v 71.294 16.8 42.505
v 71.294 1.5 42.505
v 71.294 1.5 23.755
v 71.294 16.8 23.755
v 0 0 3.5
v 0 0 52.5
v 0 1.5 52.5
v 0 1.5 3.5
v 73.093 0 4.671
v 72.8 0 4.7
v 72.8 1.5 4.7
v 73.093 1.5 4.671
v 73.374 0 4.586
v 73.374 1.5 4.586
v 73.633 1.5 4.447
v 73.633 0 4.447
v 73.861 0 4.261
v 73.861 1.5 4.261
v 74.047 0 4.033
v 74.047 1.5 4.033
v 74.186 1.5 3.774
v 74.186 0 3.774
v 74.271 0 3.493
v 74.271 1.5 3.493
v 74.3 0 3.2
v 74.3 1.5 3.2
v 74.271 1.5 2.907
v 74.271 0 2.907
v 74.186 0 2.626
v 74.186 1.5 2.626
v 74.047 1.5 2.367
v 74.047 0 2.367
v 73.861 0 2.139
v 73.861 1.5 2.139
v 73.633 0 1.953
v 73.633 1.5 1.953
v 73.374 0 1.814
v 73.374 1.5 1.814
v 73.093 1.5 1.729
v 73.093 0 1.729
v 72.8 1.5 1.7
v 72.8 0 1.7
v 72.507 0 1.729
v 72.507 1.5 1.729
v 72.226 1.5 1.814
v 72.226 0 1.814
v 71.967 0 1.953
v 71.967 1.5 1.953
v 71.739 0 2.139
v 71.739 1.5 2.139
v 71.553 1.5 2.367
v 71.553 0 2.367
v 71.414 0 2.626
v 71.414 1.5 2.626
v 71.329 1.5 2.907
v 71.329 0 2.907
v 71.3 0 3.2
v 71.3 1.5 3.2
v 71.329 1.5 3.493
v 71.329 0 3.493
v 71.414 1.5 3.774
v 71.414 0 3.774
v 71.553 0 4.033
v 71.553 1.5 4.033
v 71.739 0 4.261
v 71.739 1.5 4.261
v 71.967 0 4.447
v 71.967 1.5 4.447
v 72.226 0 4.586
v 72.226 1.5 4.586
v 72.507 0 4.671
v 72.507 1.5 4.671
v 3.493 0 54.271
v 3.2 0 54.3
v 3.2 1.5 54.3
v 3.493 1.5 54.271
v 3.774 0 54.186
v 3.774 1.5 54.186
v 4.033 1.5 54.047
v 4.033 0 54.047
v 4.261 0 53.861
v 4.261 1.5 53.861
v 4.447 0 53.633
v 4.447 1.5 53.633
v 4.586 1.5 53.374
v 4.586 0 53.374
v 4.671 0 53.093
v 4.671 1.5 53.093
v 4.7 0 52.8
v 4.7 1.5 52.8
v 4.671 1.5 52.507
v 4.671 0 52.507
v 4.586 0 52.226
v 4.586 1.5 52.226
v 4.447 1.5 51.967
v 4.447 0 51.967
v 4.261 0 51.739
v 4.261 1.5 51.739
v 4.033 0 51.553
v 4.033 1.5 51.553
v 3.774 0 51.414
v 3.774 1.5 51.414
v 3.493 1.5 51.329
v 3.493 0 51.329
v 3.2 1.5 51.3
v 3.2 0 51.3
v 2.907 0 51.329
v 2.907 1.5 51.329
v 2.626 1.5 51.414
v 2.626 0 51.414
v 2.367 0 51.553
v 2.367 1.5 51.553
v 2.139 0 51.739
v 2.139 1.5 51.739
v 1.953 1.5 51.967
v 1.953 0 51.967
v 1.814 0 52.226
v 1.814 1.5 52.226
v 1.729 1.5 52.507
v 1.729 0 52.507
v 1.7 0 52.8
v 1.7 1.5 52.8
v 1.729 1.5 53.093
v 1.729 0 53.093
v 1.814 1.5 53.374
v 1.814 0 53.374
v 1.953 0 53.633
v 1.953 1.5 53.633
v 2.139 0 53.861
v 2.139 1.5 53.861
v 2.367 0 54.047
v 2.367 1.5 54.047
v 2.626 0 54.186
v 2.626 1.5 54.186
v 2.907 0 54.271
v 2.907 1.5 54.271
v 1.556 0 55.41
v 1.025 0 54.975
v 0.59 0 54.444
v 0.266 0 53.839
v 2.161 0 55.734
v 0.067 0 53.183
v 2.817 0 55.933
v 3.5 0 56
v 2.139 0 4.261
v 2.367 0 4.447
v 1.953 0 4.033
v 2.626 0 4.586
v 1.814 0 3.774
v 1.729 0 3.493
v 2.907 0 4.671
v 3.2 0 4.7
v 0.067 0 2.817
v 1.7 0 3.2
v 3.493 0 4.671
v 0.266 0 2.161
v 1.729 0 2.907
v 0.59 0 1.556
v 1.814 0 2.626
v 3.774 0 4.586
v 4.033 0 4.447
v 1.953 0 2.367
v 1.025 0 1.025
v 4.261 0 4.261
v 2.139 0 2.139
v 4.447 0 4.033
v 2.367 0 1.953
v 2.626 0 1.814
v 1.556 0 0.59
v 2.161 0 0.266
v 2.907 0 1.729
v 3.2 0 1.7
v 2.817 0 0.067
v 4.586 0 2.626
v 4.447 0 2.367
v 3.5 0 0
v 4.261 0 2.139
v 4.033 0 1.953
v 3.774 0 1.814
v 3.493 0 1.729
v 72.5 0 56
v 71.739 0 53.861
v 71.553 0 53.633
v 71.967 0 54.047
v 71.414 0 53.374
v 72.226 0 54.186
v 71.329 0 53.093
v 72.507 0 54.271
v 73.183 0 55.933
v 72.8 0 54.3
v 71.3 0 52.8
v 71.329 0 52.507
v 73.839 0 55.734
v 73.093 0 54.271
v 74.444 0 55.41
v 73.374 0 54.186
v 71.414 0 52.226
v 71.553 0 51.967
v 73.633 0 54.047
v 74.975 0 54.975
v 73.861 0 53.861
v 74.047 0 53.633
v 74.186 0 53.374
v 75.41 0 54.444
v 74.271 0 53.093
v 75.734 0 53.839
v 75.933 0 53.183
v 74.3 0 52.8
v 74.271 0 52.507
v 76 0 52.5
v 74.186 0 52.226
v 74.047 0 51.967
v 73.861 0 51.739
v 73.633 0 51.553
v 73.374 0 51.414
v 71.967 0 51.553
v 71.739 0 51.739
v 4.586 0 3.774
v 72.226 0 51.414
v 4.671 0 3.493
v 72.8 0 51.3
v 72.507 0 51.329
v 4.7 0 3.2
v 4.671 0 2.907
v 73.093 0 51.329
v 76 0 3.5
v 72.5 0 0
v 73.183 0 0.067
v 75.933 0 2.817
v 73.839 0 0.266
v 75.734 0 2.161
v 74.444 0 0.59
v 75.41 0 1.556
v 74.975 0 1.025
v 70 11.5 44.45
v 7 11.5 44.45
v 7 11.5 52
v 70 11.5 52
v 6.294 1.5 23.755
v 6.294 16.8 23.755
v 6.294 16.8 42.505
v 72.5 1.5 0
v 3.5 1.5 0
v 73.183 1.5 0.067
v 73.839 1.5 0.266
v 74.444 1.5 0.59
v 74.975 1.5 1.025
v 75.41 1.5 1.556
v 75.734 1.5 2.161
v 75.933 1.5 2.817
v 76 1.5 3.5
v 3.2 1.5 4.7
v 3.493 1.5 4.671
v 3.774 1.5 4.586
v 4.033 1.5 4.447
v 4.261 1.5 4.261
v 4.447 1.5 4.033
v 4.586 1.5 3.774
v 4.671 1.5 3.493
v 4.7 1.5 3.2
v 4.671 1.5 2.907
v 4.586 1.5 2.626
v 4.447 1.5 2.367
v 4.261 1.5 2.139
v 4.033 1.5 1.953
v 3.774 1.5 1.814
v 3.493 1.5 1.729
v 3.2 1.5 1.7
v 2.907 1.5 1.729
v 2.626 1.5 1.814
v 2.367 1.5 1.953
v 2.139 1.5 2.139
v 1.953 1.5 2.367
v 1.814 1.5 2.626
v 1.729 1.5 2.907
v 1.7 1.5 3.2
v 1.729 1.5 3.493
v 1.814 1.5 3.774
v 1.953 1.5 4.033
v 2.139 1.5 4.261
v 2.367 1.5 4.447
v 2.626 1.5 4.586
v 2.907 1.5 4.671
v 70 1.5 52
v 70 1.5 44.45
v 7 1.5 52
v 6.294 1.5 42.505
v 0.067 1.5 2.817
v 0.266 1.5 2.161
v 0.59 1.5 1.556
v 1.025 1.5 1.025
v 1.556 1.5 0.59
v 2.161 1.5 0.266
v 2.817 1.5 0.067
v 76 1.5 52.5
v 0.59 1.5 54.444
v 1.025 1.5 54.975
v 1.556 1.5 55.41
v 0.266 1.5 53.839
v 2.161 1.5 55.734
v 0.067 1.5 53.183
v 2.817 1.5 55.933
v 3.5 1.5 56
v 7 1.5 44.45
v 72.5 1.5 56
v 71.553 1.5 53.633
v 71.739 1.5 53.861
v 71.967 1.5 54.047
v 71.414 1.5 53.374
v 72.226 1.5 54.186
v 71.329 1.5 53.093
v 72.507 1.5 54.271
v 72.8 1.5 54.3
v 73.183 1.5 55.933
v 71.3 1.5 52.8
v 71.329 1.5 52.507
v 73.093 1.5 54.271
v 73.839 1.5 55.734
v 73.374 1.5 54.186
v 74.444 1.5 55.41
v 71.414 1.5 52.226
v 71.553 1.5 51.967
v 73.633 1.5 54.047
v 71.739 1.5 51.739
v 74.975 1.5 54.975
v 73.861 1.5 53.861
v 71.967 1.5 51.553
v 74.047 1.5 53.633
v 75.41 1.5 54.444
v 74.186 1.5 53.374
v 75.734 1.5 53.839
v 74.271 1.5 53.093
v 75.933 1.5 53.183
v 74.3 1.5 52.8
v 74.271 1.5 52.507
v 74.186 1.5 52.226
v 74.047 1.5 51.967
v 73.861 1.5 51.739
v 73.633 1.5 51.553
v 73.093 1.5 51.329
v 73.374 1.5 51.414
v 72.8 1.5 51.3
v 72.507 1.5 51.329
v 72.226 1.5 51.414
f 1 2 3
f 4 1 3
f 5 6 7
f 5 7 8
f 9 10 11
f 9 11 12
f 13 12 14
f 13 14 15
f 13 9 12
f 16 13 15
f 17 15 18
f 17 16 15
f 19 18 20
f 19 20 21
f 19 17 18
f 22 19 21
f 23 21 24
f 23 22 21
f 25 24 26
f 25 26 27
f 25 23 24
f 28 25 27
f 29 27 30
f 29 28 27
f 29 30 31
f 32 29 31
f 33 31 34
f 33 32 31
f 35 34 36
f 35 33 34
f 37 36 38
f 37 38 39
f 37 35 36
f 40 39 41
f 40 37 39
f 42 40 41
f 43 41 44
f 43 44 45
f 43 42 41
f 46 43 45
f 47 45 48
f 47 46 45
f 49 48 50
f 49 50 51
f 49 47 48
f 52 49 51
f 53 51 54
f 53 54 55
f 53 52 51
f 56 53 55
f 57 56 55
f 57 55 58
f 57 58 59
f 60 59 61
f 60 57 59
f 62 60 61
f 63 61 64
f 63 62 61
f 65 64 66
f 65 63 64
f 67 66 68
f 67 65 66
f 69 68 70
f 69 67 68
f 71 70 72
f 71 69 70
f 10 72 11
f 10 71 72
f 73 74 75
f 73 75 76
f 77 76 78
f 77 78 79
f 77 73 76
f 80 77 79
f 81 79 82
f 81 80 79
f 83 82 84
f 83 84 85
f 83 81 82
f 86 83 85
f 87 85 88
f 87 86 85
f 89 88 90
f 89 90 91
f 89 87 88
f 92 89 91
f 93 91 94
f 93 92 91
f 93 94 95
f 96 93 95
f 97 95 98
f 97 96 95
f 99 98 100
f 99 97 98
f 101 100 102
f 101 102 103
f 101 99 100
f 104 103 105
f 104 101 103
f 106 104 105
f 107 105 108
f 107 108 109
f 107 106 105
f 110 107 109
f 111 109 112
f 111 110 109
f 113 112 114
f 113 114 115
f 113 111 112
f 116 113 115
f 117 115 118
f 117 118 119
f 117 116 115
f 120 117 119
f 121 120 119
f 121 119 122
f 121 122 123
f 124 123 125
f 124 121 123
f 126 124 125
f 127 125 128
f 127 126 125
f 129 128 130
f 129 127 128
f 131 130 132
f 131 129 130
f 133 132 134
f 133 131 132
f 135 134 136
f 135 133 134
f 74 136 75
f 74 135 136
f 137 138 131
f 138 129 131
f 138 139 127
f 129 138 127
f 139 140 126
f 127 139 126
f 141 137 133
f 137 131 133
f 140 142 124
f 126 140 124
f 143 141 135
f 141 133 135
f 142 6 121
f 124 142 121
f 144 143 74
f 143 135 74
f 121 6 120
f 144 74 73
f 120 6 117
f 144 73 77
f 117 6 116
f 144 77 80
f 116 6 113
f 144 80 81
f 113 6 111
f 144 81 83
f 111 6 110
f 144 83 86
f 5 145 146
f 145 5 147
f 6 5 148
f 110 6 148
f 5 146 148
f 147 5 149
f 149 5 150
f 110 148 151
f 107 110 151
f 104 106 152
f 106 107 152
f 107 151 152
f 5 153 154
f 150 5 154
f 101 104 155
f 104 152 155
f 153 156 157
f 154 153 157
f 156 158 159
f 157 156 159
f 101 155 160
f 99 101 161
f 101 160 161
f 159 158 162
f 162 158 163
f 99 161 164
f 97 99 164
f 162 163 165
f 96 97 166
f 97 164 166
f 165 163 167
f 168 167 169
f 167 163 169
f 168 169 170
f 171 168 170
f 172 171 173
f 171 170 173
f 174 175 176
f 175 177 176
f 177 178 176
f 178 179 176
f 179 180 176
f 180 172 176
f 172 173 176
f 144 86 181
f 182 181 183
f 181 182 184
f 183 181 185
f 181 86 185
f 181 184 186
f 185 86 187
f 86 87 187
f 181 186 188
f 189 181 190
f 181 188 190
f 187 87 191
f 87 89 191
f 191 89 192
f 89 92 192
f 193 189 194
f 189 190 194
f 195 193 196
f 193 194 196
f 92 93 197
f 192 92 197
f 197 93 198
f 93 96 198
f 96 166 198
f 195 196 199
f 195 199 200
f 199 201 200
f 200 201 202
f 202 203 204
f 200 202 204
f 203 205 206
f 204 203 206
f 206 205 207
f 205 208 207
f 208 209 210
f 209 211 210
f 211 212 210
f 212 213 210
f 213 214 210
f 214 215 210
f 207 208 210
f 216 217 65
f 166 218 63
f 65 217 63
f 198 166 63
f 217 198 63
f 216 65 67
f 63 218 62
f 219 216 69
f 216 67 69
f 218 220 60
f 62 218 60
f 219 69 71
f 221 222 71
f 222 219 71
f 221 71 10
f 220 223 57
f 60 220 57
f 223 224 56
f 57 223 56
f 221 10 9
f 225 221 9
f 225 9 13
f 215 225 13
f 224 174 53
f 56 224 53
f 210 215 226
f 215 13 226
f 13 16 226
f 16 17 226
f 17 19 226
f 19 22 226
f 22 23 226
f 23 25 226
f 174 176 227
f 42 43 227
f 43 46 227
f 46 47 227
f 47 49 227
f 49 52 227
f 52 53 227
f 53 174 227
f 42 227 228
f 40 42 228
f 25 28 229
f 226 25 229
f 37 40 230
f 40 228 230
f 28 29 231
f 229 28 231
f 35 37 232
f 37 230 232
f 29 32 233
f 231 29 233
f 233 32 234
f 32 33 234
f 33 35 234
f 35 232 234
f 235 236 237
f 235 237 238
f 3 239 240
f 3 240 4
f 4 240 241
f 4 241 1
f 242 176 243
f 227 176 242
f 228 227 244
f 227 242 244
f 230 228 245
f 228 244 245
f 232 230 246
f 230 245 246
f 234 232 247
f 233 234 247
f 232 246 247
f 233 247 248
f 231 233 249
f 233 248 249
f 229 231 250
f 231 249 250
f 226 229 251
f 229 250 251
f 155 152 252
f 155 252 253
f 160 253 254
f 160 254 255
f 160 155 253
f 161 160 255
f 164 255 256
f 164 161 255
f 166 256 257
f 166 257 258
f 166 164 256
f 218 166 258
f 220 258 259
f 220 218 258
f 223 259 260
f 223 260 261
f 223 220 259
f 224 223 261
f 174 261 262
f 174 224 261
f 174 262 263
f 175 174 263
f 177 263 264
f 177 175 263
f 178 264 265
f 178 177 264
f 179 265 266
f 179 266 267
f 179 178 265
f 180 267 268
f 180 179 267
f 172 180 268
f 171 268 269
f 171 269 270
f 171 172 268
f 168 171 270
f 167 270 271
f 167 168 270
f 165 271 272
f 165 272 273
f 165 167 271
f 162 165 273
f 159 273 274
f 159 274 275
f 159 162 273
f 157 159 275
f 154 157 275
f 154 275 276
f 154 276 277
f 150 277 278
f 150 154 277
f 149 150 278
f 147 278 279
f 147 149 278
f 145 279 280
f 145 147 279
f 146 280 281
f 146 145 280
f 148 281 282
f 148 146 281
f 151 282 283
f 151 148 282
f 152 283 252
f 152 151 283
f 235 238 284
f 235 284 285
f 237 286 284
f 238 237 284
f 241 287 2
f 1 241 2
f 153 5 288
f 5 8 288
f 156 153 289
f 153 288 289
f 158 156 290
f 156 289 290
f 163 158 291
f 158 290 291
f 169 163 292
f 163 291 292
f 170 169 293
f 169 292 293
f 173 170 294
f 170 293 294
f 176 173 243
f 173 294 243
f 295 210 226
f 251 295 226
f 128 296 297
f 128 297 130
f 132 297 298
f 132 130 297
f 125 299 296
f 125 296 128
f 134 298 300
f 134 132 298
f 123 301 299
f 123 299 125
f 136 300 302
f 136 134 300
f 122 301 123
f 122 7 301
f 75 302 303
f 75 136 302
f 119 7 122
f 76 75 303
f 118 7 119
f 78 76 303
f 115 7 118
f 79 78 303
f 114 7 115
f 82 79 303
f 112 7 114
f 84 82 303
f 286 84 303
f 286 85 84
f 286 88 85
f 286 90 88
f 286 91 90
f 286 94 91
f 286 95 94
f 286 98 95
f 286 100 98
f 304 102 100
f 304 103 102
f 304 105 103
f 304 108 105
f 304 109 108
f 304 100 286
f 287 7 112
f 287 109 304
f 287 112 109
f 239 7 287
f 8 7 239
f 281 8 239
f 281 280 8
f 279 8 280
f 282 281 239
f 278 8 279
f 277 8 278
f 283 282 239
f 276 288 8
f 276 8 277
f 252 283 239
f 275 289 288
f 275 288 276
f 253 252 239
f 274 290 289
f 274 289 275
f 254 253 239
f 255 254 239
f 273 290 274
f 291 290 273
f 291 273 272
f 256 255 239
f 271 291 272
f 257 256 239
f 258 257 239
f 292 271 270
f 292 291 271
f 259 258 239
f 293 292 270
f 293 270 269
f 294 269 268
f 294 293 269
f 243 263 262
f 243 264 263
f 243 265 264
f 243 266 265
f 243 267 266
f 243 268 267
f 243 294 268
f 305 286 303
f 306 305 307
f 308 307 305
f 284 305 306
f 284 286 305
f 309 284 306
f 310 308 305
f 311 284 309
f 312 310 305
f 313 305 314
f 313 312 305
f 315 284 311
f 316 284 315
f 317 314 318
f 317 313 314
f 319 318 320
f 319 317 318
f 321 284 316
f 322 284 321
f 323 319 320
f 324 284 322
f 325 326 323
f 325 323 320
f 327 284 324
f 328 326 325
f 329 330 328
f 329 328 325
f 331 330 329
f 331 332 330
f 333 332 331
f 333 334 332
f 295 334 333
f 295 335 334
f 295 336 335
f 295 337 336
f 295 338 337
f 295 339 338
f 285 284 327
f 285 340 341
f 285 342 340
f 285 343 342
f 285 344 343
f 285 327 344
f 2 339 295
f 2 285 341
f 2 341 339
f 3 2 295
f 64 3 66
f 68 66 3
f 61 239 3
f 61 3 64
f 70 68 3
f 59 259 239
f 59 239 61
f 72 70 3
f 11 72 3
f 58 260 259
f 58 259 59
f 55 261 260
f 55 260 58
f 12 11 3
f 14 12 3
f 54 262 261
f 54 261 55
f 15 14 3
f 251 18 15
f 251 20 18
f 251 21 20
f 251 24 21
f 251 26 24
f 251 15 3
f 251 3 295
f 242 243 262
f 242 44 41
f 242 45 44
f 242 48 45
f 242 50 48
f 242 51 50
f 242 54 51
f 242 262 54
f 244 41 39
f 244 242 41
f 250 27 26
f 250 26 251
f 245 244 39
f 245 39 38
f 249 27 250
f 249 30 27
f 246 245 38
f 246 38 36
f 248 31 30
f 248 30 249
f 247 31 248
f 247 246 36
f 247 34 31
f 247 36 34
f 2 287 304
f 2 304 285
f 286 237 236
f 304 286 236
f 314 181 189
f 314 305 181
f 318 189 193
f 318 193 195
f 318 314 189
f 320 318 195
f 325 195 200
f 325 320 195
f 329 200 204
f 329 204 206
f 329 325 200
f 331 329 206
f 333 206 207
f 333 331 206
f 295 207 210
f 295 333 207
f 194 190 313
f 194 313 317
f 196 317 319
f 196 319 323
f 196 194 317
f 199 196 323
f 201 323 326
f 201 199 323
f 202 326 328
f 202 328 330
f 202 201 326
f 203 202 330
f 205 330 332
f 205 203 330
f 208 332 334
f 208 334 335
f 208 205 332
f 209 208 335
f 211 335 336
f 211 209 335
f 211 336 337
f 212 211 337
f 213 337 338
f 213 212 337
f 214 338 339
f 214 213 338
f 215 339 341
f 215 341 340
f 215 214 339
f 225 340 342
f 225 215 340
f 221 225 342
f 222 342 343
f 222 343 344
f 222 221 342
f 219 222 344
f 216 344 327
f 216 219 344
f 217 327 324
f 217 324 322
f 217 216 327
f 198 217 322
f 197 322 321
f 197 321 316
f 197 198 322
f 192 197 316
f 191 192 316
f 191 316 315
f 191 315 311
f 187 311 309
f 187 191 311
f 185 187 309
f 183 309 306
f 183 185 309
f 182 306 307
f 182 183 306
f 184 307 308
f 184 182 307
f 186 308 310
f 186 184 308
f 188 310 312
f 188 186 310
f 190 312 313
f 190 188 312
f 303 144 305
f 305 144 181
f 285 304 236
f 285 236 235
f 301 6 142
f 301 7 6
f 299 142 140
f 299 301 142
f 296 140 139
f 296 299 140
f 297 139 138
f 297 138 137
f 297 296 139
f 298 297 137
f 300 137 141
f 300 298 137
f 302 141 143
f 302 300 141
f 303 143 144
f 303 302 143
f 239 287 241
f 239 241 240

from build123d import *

# Parameters (mm, degrees)
SKETCH1_W           = 76
SKETCH1_H           = 56
SKETCH1_R           = 1.5
BOSS_EXTRUDE1_DEPTH = 1.5
FILLET1_R           = 3.5
SKETCH3_W           = 63
SKETCH3_H           = 7.55
BOSS_EXTRUDE3_DEPTH = 10
SKETCH4_W           = 65
SKETCH4_H           = 18.75
BOSS_EXTRUDE4_DEPTH = 15.3


with BuildPart() as part:
    # Sketch1 → Boss-Extrude1 (new body)
    with BuildSketch(Plane(origin=(0, 0, 0), x_dir=(1, 0, 0), z_dir=(0, 1, 0))):
        with Locations((38, -28)):
            Rectangle(SKETCH1_W, SKETCH1_H)
        with Locations(Location((72.8, -52.8, 0), (0, 0, 270))):
            Circle(SKETCH1_R, mode=Mode.SUBTRACT)
        with Locations(Location((72.8, -3.2, 0), (0, 0, 270))):
            Circle(SKETCH1_R, mode=Mode.SUBTRACT)
        with Locations(Location((3.2, -3.2, 0), (0, 0, 270))):
            Circle(SKETCH1_R, mode=Mode.SUBTRACT)
        with Locations(Location((3.2, -52.8, 0), (0, 0, 270))):
            Circle(SKETCH1_R, mode=Mode.SUBTRACT)
    extrude(amount=BOSS_EXTRUDE1_DEPTH)

    # Fillet1
    fillet1_edges = [part.edges().sort_by_distance(p)[0] for p in [
        (0, 0.75, 56),
        (0, 0.75, 0),
        (76, 0.75, 0),
        (76, 0.75, 56),
    ]]
    fillet(fillet1_edges, radius=FILLET1_R)

    # Sketch3 → Boss-Extrude3 (add)
    with BuildSketch(Plane(origin=(0, 1.5, 0), x_dir=(1, 0, 0), z_dir=(0, 1, 0))):
        with Locations((38.5, -48.225)):
            Rectangle(SKETCH3_W, SKETCH3_H)
    extrude(amount=BOSS_EXTRUDE3_DEPTH)

    # Sketch4 → Boss-Extrude4 (add)
    with BuildSketch(Plane(origin=(0, 1.5, 0), x_dir=(1, 0, 0), z_dir=(0, 1, 0))):
        with Locations((38.794123638, -33.130364422)):
            Rectangle(SKETCH4_W, SKETCH4_H)
    extrude(amount=BOSS_EXTRUDE4_DEPTH)


solid = part.part
